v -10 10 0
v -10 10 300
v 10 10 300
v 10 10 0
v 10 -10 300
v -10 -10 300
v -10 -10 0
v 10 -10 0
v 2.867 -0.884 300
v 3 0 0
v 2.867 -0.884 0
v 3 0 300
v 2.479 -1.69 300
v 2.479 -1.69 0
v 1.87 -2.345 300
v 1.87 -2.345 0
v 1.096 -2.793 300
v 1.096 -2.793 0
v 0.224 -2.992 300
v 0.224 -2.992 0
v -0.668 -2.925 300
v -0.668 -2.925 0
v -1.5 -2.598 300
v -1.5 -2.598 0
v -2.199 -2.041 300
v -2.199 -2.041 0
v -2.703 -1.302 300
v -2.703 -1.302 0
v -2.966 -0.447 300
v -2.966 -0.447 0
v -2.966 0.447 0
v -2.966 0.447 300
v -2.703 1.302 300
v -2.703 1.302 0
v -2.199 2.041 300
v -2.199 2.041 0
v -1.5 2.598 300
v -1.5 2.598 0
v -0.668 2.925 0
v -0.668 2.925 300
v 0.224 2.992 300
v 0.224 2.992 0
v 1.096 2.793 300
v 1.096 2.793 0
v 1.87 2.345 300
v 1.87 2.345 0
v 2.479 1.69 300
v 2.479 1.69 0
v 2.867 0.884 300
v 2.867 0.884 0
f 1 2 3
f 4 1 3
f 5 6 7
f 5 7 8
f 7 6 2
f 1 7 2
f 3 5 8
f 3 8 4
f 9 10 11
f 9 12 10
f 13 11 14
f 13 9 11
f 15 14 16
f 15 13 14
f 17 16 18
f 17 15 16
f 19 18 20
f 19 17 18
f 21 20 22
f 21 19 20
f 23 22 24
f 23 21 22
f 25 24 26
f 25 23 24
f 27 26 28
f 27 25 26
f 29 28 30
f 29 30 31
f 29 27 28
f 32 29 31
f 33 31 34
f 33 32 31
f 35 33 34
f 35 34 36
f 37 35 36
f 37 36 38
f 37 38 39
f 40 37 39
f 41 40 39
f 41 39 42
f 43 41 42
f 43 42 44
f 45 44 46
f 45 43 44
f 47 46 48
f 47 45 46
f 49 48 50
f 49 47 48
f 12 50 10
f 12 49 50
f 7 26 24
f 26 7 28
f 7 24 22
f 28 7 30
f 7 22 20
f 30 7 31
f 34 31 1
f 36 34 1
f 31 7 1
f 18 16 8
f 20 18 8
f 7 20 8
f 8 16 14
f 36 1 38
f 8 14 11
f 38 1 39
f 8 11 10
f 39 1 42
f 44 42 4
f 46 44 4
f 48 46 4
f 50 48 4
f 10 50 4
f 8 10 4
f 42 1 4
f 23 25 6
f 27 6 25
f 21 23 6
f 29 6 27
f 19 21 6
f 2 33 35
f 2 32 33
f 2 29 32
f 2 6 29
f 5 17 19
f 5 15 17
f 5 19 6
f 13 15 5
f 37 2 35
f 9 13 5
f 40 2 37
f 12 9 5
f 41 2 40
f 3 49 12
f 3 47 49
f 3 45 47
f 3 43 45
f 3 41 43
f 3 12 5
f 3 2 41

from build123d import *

# Parameters (mm, degrees)
ESQUISSE1_W             = 20
ESQUISSE1_H             = 20
BOSS_EXTRU_1_DEPTH      = 300
ESQUISSE2_R             = 3
ENL_V_MAT_EXTRU_1_DEPTH = 200
ENL_V_START             = -200
ESQUISSE3_R             = 3
ENL_V_MAT_EXTRU_2_DEPTH = 200


with BuildPart() as part:
    # Esquisse1 → Boss.-Extru.1 (new body)
    with BuildSketch(Plane.XY):
        Rectangle(ESQUISSE1_W, ESQUISSE1_H)
    extrude(amount=BOSS_EXTRU_1_DEPTH)

    # Esquisse2 → Enlèv. mat.-Extru.1 (cut)
    with BuildSketch(Plane.XY.offset(300)):
        Circle(ESQUISSE2_R)
    extrude(amount=-ENL_V_MAT_EXTRU_1_DEPTH, mode=Mode.SUBTRACT)

    # Esquisse3 → Enlèv. mat.-Extru.2 (cut)
    with BuildSketch(Plane(origin=(0, 0, 0), x_dir=(-1, 0, 0), z_dir=(0, 0, -1)).offset(ENL_V_START)):
        with Locations(Location((0, 0, 0), (0, 0, 180))):
            Circle(ESQUISSE3_R)
    extrude(amount=ENL_V_MAT_EXTRU_2_DEPTH, mode=Mode.SUBTRACT)


solid = part.part
